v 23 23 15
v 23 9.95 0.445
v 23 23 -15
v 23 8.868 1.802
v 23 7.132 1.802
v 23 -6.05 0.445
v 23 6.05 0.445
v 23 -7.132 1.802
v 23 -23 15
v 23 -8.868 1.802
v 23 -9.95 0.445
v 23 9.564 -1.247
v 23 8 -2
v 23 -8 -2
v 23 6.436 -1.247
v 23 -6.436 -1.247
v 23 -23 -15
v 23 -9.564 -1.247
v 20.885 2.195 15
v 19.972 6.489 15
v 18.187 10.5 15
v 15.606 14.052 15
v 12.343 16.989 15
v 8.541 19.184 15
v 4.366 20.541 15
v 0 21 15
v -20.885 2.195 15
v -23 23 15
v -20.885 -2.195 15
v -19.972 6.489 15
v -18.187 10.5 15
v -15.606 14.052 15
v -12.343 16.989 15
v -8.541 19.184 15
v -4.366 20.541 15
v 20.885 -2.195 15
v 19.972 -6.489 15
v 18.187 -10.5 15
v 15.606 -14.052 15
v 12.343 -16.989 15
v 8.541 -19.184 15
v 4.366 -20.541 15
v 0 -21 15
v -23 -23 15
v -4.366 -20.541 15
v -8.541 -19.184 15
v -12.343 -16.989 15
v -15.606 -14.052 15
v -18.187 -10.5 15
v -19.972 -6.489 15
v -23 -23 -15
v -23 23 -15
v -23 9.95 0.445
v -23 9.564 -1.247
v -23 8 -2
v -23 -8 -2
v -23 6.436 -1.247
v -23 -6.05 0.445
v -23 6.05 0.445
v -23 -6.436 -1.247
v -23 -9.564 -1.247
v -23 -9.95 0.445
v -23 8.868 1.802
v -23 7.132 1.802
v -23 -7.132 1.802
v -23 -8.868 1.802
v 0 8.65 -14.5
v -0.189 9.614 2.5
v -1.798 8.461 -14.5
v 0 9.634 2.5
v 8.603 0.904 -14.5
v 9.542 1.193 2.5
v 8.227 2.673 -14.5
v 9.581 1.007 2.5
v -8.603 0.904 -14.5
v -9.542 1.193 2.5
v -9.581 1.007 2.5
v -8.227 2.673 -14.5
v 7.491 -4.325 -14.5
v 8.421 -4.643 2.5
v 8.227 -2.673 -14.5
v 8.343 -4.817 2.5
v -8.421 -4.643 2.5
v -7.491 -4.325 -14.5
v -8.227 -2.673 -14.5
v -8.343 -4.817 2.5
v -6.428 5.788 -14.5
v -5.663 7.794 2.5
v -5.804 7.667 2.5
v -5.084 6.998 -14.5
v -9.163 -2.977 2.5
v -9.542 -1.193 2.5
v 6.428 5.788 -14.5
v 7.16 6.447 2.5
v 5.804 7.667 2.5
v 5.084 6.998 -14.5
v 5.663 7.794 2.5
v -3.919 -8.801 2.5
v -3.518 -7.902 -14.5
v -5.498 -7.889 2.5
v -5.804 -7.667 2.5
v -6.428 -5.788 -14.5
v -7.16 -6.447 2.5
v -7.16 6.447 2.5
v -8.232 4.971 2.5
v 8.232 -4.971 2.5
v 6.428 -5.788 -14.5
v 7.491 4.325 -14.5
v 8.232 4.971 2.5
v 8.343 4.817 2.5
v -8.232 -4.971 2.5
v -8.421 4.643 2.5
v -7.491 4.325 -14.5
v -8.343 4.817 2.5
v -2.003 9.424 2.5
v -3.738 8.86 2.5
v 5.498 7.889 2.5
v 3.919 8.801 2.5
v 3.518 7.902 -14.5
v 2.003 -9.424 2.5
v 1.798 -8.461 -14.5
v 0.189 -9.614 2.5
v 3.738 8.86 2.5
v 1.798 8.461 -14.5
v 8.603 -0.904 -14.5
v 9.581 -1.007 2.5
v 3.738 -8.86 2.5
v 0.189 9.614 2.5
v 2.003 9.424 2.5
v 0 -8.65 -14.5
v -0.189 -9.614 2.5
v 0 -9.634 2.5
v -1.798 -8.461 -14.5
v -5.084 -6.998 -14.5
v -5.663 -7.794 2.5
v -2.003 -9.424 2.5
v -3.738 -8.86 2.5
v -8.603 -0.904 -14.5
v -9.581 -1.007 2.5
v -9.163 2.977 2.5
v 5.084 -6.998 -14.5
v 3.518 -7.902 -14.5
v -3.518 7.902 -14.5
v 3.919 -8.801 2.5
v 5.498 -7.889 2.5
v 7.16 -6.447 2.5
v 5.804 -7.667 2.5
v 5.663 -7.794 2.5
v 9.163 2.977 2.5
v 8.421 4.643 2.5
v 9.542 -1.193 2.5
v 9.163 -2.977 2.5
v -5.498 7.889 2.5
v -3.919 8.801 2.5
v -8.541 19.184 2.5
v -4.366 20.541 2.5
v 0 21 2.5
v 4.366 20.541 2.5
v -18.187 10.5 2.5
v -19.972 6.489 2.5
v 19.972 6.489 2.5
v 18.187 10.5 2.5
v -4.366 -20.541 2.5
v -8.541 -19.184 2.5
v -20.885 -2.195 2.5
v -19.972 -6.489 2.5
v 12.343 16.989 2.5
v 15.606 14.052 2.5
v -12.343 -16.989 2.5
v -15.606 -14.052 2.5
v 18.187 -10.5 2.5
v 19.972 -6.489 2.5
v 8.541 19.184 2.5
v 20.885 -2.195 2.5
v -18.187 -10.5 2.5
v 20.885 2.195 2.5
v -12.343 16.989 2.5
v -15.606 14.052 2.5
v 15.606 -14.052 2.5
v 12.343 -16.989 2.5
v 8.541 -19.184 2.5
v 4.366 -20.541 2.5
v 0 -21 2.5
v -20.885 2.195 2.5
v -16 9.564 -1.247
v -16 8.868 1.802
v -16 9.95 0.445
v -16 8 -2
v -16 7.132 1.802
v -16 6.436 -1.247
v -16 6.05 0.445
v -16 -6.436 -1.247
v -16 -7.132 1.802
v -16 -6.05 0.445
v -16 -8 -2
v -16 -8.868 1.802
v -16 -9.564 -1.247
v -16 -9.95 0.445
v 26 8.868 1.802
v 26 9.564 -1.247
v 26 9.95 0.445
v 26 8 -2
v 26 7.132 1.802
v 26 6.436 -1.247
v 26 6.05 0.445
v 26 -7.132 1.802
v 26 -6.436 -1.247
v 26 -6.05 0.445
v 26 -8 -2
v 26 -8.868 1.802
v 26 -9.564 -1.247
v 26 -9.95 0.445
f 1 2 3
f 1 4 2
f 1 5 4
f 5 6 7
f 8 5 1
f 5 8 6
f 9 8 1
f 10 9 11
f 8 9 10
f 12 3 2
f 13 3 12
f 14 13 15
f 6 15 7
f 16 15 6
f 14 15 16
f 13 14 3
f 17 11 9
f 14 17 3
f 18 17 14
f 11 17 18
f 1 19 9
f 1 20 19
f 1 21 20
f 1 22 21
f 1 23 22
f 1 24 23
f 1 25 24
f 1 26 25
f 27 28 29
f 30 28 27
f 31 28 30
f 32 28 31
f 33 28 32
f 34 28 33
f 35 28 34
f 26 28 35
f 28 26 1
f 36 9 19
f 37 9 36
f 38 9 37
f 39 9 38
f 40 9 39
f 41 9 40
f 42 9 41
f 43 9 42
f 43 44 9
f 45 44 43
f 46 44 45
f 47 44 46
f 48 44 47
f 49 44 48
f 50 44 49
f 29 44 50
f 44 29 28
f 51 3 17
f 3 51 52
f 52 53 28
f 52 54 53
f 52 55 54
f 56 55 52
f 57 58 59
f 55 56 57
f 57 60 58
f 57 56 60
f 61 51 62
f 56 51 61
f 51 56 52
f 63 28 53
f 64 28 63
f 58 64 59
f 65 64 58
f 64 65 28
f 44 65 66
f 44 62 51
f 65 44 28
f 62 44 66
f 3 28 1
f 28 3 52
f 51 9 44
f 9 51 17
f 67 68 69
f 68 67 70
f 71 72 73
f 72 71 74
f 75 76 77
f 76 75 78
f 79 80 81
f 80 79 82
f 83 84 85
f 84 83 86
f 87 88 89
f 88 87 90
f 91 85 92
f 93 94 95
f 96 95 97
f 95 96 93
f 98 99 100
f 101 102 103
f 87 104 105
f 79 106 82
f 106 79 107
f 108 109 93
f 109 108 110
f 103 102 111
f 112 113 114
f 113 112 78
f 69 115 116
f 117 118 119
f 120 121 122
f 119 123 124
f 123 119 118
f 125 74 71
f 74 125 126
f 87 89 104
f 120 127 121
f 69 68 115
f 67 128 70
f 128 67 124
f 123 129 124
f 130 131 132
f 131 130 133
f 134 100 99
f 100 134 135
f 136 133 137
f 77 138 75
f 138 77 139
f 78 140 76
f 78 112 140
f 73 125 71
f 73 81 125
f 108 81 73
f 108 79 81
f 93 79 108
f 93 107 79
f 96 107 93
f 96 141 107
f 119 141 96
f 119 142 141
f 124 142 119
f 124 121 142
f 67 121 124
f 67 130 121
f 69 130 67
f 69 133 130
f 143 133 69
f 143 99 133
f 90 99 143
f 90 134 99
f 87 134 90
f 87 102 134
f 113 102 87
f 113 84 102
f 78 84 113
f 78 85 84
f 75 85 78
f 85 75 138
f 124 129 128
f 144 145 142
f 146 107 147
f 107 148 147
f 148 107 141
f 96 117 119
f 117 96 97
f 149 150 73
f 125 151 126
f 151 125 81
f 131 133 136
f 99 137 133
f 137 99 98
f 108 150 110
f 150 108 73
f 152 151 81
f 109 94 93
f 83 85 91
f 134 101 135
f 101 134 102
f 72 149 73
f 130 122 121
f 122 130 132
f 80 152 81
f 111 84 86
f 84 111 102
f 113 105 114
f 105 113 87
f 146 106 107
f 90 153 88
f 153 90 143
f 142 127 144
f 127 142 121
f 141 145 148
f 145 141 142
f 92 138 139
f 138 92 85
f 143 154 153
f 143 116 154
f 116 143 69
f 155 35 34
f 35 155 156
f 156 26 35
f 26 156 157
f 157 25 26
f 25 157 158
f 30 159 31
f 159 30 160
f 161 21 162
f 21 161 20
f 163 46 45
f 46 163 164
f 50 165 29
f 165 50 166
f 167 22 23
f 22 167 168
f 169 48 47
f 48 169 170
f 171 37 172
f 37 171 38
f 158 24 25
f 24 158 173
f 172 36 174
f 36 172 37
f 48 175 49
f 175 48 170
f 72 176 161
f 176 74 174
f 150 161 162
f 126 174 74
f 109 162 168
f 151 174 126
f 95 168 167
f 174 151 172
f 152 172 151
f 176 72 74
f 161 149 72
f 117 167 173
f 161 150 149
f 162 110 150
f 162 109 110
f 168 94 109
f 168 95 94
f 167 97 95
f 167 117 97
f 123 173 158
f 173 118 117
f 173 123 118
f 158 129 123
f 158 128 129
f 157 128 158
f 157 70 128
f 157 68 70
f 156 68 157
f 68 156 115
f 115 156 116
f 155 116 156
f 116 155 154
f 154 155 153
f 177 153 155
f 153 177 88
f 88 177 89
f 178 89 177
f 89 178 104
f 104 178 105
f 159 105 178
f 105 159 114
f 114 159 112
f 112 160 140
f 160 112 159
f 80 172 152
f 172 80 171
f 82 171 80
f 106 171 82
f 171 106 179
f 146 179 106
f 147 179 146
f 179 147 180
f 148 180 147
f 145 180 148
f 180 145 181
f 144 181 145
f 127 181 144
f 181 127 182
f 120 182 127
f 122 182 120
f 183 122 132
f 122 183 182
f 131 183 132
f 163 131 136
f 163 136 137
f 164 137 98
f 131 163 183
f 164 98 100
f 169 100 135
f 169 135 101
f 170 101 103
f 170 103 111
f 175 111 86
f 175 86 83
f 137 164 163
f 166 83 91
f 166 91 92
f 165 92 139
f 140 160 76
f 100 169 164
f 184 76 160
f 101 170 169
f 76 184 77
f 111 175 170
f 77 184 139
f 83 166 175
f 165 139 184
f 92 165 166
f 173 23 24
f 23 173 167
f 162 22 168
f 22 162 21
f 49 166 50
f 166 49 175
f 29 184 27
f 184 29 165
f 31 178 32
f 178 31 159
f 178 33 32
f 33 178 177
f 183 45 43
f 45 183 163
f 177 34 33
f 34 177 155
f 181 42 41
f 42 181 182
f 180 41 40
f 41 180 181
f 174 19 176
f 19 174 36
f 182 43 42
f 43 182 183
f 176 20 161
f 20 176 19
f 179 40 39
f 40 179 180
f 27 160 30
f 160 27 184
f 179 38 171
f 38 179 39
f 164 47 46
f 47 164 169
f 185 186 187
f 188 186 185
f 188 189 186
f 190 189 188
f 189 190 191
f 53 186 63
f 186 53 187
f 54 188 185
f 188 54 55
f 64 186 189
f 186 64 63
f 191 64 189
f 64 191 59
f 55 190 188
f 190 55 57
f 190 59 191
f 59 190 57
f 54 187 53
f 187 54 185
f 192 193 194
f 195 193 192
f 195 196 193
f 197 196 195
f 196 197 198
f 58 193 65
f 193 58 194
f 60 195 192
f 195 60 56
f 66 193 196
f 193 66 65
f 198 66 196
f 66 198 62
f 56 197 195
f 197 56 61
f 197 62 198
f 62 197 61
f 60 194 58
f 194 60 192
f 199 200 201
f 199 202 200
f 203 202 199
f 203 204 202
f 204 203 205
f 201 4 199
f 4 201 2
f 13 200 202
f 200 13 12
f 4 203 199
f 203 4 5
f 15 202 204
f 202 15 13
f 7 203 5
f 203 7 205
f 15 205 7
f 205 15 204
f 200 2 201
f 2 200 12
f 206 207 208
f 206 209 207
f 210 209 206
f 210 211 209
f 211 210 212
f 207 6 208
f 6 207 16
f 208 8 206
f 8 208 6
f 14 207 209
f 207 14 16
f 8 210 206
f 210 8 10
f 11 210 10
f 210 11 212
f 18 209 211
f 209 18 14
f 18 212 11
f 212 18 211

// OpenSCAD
// --- front mounting points
rotate([0, 90, 0]) 
    translate([0, 8, 22]) 
    cylinder(h = 8, r1 = 2, r2 = 2, center = true);

// 17.3, 19.5
rotate([0, 90, 0]) 
    translate([0, -8, 22]) 
    cylinder(h = 8, r1 = 2, r2 = 2, center = true);
// --- front mounting points

// -- main cube
difference() {
    cube([46, 46, 30], center = true);
    
    // --- bottom inner cylinder
    rotate([0, 0, 90]) 
        translate([0, 0, -5]) 
        cylinder(h = 19, r1 = 8.65, r2 = 9.75, center = true);
    // --- bottom inner cylinder

    // --- top inner cylinder
    rotate([0, 0, 90]) 
        translate([0, 0, 10]) 
        cylinder(h = 15, r1 = 21, r2 = 21, center = true);
    // --- top inner cylinder

    // -- back mounting points
    rotate([0, 90, 0]) 
        translate([0, 8, -20]) 
        cylinder(h = 8, r1 = 2, r2 = 2, center = true);

    
    rotate([0, 90, 0]) 
        translate([0, -8, -20]) 
        cylinder(h = 8, r1 = 2, r2 = 2, center = true);
    // -- back mounting points
}
// -- main cube
